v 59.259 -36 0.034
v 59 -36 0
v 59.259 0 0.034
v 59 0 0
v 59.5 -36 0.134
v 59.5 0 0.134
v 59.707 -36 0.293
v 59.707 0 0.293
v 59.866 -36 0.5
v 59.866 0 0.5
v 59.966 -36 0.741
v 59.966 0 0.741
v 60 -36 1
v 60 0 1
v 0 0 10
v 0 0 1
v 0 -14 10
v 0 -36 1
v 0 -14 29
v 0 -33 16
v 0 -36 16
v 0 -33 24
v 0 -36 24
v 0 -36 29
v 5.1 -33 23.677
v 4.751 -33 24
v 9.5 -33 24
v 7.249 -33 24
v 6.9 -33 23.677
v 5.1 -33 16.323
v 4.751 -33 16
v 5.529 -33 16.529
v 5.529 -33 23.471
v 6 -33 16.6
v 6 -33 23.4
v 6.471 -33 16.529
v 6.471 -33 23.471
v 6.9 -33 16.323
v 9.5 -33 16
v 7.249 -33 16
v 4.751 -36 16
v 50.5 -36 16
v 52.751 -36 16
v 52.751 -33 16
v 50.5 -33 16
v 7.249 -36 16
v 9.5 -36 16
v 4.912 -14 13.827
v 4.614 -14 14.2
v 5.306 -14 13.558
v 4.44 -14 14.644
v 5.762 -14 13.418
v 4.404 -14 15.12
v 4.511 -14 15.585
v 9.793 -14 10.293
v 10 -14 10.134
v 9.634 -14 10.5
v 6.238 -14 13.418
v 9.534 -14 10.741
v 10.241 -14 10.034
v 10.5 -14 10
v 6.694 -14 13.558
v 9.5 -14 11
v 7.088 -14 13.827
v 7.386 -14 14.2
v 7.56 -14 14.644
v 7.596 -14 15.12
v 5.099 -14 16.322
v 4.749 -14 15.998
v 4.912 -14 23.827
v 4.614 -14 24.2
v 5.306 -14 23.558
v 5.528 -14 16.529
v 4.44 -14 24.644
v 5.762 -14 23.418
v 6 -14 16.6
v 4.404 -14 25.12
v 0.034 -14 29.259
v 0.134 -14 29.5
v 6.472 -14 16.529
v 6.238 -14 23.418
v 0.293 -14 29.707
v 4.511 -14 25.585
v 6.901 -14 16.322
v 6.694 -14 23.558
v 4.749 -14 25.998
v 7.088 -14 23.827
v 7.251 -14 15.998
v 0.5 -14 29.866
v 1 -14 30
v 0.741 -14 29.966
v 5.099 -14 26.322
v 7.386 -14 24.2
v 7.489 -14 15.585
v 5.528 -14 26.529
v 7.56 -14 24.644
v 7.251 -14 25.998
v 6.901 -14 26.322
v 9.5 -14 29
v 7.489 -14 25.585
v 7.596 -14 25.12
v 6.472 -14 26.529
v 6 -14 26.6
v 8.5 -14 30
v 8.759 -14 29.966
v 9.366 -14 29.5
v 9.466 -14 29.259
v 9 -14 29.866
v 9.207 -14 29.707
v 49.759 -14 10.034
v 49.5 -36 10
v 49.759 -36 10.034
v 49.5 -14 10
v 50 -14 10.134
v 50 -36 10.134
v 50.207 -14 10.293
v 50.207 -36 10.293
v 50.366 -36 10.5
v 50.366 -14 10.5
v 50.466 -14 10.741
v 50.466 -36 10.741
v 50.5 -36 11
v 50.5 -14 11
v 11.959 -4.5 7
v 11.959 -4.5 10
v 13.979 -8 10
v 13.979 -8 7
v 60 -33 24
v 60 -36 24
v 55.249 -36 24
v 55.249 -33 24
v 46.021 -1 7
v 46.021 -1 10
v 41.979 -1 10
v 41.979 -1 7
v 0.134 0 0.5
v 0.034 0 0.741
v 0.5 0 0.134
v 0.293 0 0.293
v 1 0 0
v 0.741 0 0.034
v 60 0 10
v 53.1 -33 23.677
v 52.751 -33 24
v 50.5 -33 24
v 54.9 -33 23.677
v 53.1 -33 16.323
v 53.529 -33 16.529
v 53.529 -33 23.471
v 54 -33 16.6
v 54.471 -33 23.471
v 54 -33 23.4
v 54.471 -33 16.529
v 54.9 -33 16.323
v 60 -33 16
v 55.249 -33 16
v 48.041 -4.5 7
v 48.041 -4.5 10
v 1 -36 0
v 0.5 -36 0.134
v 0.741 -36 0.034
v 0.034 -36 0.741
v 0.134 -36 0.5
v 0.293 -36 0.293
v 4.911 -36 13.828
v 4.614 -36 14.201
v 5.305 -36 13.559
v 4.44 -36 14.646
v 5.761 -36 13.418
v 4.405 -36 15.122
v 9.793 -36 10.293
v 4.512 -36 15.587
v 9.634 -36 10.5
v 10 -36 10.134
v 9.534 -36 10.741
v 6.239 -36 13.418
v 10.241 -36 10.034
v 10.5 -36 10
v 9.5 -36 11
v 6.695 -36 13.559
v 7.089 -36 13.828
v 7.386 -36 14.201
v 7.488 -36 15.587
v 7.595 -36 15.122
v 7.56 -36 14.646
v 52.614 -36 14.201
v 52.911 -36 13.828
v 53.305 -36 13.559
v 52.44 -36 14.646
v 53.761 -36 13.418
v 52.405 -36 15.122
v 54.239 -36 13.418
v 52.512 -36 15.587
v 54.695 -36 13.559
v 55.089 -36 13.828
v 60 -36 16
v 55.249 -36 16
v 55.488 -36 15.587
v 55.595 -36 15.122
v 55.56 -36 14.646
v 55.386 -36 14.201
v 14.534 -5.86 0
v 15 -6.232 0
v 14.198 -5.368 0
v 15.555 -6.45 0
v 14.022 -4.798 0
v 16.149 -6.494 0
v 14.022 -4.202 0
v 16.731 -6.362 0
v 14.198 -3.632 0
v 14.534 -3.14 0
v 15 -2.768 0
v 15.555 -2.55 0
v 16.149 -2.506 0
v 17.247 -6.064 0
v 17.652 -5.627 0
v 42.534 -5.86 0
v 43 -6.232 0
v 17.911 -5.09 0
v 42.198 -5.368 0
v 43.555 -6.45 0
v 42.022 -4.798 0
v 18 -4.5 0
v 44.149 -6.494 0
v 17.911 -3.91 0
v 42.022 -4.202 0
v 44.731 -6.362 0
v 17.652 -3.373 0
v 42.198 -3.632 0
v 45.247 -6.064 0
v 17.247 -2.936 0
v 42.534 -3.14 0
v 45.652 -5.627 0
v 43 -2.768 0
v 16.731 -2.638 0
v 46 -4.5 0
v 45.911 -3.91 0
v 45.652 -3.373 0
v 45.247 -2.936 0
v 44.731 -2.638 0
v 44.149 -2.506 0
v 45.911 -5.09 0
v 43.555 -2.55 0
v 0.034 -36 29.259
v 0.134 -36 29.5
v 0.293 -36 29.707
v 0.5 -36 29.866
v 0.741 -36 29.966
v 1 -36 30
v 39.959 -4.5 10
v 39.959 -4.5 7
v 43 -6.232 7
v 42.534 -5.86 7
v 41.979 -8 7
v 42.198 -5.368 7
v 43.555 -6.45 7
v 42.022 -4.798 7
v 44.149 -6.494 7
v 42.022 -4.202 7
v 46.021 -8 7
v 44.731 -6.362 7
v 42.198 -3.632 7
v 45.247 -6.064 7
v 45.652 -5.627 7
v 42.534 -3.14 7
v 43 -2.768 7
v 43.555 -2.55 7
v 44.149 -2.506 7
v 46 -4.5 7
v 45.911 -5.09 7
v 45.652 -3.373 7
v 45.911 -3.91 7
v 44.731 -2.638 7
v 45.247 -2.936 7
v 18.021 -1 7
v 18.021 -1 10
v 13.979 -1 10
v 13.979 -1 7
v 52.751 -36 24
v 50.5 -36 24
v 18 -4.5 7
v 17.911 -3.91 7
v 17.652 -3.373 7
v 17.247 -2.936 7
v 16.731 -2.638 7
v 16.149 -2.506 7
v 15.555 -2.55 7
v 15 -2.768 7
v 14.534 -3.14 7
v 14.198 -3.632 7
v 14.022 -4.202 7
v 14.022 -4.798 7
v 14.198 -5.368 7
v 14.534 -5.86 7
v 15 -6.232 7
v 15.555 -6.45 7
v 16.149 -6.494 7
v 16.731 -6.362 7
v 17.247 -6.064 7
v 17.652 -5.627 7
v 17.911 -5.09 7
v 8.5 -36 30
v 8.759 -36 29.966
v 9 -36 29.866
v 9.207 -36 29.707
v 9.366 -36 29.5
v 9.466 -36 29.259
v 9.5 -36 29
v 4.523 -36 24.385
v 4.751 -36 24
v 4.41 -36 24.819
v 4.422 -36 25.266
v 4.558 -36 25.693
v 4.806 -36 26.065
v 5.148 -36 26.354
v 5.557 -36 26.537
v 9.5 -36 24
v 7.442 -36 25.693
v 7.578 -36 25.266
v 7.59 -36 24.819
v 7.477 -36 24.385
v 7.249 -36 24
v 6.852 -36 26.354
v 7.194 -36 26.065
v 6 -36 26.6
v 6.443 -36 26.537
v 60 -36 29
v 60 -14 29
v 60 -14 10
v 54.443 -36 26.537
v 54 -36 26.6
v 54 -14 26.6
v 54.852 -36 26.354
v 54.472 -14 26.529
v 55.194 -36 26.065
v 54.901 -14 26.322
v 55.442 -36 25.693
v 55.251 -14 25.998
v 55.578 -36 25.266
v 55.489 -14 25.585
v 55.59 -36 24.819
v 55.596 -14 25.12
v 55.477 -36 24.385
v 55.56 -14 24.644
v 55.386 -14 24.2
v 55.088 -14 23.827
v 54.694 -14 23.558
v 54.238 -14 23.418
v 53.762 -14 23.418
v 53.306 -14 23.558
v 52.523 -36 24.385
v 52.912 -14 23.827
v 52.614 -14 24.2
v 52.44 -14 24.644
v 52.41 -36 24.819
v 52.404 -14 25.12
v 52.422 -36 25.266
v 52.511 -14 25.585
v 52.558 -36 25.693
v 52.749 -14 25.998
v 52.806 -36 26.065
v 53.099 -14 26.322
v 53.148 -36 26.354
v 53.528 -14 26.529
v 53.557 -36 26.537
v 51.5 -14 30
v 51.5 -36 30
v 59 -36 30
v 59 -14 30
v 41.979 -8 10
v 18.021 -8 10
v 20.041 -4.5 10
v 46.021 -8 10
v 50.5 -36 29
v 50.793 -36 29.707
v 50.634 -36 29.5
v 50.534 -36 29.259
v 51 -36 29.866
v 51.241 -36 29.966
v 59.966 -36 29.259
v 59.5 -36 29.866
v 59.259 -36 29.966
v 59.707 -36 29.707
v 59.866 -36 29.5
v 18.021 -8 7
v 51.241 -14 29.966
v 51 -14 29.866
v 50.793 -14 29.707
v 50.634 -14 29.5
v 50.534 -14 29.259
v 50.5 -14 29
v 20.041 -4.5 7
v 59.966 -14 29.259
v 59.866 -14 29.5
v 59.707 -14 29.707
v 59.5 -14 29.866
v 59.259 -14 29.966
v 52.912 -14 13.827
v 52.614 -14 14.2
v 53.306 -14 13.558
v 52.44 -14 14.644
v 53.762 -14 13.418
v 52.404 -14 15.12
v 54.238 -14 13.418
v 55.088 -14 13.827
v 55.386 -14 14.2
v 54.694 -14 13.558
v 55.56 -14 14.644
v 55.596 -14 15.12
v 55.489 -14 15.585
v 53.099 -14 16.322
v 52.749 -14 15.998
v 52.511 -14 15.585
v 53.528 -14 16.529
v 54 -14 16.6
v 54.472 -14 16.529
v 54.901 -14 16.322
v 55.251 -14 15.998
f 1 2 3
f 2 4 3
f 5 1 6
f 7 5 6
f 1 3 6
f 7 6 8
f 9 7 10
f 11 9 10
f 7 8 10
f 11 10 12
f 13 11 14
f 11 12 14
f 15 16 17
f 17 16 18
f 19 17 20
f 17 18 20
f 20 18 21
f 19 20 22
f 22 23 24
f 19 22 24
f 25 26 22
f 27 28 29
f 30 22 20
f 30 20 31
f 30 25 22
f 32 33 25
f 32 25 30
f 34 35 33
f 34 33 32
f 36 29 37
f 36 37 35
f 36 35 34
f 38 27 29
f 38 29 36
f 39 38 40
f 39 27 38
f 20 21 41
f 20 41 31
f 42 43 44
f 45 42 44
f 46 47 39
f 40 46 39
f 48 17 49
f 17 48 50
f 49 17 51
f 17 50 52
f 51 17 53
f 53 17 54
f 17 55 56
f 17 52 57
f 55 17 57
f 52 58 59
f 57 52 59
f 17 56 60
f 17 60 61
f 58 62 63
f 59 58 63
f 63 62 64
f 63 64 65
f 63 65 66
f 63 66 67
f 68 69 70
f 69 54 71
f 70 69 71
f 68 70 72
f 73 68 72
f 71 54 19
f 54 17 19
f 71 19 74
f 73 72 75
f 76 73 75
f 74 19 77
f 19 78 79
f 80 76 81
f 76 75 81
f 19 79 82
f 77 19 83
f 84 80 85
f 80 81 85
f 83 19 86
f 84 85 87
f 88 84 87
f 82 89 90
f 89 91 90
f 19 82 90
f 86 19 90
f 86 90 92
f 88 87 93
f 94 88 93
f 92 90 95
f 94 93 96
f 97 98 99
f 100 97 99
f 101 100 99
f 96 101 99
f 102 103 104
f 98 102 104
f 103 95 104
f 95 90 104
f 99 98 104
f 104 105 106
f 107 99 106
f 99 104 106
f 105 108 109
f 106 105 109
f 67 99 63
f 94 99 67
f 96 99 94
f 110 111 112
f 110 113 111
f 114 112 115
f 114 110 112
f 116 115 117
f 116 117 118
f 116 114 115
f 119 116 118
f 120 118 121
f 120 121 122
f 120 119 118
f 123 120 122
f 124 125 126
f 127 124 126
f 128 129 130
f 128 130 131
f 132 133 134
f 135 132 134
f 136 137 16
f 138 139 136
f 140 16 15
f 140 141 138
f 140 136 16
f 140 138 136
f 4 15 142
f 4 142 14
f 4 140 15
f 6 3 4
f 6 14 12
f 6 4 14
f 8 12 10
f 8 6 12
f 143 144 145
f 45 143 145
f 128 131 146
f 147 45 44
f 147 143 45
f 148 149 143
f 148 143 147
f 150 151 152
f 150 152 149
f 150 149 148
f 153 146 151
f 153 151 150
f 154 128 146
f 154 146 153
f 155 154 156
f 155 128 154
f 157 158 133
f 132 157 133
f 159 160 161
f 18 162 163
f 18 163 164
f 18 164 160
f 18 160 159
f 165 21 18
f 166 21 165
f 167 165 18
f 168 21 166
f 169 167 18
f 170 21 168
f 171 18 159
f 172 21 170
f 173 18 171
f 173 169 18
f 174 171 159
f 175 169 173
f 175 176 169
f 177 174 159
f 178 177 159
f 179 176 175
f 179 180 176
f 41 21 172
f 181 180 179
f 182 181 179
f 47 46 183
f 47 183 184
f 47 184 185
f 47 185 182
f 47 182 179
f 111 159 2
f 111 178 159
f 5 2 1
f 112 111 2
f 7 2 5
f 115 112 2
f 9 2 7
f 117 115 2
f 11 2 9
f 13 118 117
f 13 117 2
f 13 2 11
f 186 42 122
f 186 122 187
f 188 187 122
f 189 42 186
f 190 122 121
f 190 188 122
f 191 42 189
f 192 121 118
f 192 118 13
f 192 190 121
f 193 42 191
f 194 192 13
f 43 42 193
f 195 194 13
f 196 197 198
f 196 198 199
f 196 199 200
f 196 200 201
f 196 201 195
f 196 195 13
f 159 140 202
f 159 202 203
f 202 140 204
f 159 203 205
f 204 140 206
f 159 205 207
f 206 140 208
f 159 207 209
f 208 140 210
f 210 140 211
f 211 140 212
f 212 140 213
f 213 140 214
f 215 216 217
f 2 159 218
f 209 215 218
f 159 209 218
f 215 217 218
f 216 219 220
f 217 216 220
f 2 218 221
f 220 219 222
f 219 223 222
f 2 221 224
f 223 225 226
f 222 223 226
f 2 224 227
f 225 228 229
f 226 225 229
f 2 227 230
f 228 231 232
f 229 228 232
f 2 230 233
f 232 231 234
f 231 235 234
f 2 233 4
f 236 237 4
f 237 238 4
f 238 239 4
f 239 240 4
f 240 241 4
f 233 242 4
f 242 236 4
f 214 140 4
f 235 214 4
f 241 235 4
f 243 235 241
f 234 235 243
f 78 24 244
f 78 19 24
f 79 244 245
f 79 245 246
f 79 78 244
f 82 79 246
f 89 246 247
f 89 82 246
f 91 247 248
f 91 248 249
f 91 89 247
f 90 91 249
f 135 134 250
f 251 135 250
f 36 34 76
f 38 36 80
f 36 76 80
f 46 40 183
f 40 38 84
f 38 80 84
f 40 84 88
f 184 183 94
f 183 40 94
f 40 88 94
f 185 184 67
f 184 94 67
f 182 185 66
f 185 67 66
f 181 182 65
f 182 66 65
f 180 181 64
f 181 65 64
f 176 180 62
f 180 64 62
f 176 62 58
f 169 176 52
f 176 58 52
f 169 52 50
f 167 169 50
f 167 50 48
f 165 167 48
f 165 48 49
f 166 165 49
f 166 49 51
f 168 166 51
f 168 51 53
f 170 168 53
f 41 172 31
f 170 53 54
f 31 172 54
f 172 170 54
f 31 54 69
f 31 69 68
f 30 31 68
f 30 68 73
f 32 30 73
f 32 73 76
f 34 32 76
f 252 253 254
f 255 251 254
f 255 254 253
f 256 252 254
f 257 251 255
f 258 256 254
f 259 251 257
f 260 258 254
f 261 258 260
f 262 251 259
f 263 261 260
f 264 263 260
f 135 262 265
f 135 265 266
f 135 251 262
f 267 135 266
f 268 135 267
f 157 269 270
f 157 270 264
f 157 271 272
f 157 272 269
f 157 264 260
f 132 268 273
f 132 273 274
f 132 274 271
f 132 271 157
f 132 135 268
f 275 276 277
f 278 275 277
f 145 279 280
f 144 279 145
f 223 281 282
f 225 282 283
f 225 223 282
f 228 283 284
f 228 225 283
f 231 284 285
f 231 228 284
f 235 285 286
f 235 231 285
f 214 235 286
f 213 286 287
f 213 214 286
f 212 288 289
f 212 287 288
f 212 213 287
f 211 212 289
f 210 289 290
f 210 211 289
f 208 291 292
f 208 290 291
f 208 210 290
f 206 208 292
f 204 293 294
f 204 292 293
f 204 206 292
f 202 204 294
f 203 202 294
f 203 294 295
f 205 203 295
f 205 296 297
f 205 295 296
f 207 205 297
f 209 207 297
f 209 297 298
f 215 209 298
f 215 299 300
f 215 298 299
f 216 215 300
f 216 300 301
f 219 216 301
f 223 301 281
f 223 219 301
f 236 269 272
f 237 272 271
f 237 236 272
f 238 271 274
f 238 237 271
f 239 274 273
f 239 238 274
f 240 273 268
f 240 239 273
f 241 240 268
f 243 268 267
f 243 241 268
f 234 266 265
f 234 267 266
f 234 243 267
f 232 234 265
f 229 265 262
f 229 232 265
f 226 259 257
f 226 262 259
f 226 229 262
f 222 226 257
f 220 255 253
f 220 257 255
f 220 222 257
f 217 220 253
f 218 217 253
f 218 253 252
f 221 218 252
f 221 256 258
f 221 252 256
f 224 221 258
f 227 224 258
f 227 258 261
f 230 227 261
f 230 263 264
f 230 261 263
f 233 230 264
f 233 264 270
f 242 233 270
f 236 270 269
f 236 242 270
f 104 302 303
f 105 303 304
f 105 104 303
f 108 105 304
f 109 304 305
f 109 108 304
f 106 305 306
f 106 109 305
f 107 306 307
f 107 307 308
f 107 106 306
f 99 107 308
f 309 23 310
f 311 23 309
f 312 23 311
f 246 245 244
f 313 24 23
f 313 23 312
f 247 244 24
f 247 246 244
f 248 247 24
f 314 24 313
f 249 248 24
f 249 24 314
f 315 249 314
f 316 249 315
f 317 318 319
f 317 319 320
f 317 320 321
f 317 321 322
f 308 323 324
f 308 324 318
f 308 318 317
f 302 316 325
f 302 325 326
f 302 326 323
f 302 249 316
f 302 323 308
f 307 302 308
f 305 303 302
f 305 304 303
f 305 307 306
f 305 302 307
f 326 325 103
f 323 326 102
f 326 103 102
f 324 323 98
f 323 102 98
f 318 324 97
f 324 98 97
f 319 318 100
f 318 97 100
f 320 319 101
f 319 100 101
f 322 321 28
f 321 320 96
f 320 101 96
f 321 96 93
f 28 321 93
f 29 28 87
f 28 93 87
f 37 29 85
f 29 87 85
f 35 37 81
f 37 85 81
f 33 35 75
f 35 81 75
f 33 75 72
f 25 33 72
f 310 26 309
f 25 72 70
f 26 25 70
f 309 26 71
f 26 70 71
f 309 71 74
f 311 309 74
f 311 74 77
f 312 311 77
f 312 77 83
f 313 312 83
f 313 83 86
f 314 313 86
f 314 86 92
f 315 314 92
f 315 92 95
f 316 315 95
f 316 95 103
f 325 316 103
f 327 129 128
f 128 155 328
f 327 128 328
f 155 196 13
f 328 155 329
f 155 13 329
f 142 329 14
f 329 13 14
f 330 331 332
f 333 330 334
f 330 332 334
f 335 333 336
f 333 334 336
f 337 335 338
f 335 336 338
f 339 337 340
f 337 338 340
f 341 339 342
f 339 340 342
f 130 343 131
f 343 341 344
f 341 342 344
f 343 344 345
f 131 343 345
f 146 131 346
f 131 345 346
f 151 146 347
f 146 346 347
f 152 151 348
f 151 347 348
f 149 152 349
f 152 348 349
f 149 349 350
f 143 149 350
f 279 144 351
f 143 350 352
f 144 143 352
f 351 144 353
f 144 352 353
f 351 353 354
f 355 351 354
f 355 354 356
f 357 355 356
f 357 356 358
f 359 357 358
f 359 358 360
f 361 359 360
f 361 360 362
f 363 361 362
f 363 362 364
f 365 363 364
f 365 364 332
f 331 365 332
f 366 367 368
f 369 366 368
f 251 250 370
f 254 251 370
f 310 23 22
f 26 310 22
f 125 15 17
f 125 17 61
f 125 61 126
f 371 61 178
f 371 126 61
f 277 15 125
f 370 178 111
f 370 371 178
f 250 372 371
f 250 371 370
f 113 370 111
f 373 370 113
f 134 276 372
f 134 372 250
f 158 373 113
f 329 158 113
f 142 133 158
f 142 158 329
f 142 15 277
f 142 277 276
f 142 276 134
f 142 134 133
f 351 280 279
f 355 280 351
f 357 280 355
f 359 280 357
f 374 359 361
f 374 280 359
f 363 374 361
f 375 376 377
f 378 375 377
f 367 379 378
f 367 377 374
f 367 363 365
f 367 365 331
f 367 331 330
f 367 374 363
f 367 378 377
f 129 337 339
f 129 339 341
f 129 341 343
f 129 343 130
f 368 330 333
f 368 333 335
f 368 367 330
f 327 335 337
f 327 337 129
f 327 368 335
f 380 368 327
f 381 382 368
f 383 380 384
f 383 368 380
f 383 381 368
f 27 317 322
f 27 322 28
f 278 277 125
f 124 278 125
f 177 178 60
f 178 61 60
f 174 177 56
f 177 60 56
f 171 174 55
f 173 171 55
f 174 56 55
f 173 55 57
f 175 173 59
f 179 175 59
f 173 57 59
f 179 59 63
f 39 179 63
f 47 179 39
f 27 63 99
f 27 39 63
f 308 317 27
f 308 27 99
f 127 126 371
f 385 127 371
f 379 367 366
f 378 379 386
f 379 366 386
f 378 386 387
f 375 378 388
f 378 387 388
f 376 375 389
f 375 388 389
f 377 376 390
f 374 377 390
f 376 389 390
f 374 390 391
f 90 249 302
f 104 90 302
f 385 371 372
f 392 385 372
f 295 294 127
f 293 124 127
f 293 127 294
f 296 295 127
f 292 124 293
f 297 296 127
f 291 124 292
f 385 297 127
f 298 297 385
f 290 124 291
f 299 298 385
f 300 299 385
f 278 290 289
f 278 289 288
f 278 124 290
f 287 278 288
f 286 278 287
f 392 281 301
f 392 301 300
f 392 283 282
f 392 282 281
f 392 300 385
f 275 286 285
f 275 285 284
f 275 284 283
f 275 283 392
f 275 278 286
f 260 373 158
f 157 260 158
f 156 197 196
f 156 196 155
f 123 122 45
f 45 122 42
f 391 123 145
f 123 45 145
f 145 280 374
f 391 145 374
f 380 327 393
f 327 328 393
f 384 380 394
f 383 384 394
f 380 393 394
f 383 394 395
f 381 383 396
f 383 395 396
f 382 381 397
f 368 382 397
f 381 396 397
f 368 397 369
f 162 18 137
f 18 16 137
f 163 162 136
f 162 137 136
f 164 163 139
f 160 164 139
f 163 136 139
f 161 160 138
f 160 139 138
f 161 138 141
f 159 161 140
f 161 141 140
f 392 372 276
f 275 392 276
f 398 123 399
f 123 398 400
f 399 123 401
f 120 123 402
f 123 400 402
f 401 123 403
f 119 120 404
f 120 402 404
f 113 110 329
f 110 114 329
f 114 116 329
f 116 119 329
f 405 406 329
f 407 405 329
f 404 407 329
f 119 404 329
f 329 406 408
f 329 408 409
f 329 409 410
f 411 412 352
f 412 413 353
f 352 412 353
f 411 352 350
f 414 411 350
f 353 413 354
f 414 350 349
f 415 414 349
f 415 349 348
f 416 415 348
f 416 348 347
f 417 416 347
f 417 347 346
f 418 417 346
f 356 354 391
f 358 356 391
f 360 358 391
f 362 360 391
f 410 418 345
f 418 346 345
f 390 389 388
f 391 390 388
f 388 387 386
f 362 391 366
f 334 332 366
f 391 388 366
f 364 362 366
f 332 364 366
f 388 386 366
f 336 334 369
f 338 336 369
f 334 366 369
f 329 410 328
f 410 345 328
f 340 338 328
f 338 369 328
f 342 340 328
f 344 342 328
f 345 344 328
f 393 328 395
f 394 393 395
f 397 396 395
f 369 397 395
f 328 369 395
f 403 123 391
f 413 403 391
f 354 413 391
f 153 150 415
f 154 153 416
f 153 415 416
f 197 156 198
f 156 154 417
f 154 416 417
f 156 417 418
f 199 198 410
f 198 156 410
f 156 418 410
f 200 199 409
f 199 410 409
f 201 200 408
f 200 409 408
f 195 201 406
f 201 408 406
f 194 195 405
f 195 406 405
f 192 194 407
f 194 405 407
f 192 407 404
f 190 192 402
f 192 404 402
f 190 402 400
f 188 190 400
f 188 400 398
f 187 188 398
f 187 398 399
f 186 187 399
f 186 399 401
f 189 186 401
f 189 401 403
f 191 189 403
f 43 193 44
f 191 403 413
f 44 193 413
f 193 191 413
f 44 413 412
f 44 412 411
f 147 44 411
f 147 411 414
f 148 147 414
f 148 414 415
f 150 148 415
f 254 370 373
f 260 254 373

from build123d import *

# Parameters (mm, degrees)
SKETCH1_W           = 60
SKETCH1_H           = 36
SKETCH1_R           = 2
BOSS_EXTRUDE1_DEPTH = 10
SKETCH2_W           = 9.5
SKETCH2_H           = 20
BOSS_EXTRUDE2_DEPTH = 22
CUT_EXTRUDE1_REACH  = 72.597
SKETCH3_R           = 1.6
CUT_EXTRUDE2_DEPTH  = 3
LPATTERN1_COUNT     = 2
LPATTERN1_PITCH     = 28
FILLET1_R           = 1
SKETCH6_W           = 8
SKETCH6_H           = 3
CUT_EXTRUDE3_DEPTH  = 77.131465243


with BuildPart() as part:
    # Sketch1 → Boss-Extrude1 (new body)
    with BuildSketch(Plane.XY):
        with Locations((30, -18)):
            Rectangle(SKETCH1_W, SKETCH1_H)
        with Locations((16, -4.5)):
            Circle(SKETCH1_R, mode=Mode.SUBTRACT)
        with Locations((44, -4.5)):
            Circle(SKETCH1_R, mode=Mode.SUBTRACT)
    extrude(amount=BOSS_EXTRUDE1_DEPTH)

    # Sketch2 → Boss-Extrude2 (add)
    with BuildSketch(Plane.XZ.offset(36)):
        with Locations((4.75, 20)):
            Rectangle(SKETCH2_W, SKETCH2_H)
        with Locations((55.25, 20)):
            Rectangle(SKETCH2_W, SKETCH2_H)
    extrude(amount=-BOSS_EXTRUDE2_DEPTH)

    # Sketch3 → Cut-Extrude1 (cut, up to next)
    with BuildSketch(Plane(origin=(0, -14, 0), x_dir=(1, 0, 0), z_dir=(0, 1, 0)), mode=Mode.PRIVATE) as cut_extrude1_sk1:
        with Locations(Location((6, -15, 0), (0, 0, 270))):
            Circle(SKETCH3_R)
    cut_extrude1_tool1 = extrude(cut_extrude1_sk1.sketch, amount=-CUT_EXTRUDE1_REACH, mode=Mode.PRIVATE) & part.part
    # Sketch3 → Cut-Extrude1 (cut, up to next)
    with BuildSketch(Plane(origin=(0, -14, 0), x_dir=(1, 0, 0), z_dir=(0, 1, 0)), mode=Mode.PRIVATE) as cut_extrude1_sk2:
        with Locations(Location((54, -15, 0), (0, 0, 270))):
            Circle(SKETCH3_R)
    cut_extrude1_tool2 = extrude(cut_extrude1_sk2.sketch, amount=-CUT_EXTRUDE1_REACH, mode=Mode.PRIVATE) & part.part
    # Sketch3 → Cut-Extrude1 (cut, up to next)
    with BuildSketch(Plane(origin=(0, -14, 0), x_dir=(1, 0, 0), z_dir=(0, 1, 0)), mode=Mode.PRIVATE) as cut_extrude1_sk3:
        with Locations(Location((54, -25, 0), (0, 0, 270))):
            Circle(SKETCH3_R)
    cut_extrude1_tool3 = extrude(cut_extrude1_sk3.sketch, amount=-CUT_EXTRUDE1_REACH, mode=Mode.PRIVATE) & part.part
    # Sketch3 → Cut-Extrude1 (cut, up to next)
    with BuildSketch(Plane(origin=(0, -14, 0), x_dir=(1, 0, 0), z_dir=(0, 1, 0)), mode=Mode.PRIVATE) as cut_extrude1_sk4:
        with Locations(Location((6, -25, 0), (0, 0, 270))):
            Circle(SKETCH3_R)
    cut_extrude1_tool4 = extrude(cut_extrude1_sk4.sketch, amount=-CUT_EXTRUDE1_REACH, mode=Mode.PRIVATE) & part.part
    add(cut_extrude1_tool1.solids().sort_by_distance((6, -14, 15))[0], mode=Mode.SUBTRACT)
    add(cut_extrude1_tool2.solids().sort_by_distance((54, -14, 15))[0], mode=Mode.SUBTRACT)
    add(cut_extrude1_tool3.solids().sort_by_distance((54, -14, 25))[0], mode=Mode.SUBTRACT)
    add(cut_extrude1_tool4.solids().sort_by_distance((6, -14, 25))[0], mode=Mode.SUBTRACT)

    # Sketch4 → Cut-Extrude2 (cut)
    with BuildSketch(Plane.XY.offset(10)):
        Polygon((13.979274058, -1), (11.958548116, -4.5), (13.979274058, -8), (18.020725942, -8), (20.041451884, -4.5), (18.020725942, -1), align=None)
    cut_extrude2 = extrude(amount=-CUT_EXTRUDE2_DEPTH, mode=Mode.SUBTRACT)

    # LPattern1: Cut-Extrude2 ×2
    with Locations(*[(i * LPATTERN1_PITCH, 0, 0) for i in range(1, LPATTERN1_COUNT)]):
        add(cut_extrude2, mode=Mode.SUBTRACT)

    # Fillet1
    fillet1_edges = [part.edges().sort_by_distance(p)[0] for p in [
        (0, -25, 30),
        (9.5, -25, 30),
        (9.5, -25, 10),
        (60, -25, 30),
        (50.5, -25, 10),
        (50.5, -25, 30),
        (60, -18, 0),
        (0, -18, 0),
    ]]
    fillet(fillet1_edges, radius=FILLET1_R)

    # Sketch6 → Cut-Extrude3 (cut, through all)
    with BuildSketch(Plane(origin=(60, 0, 0), x_dir=(0, 0, -1), z_dir=(1, 0, 0))):
        with Locations((-20, -34.5)):
            Rectangle(SKETCH6_W, SKETCH6_H)
    extrude(amount=-CUT_EXTRUDE3_DEPTH, mode=Mode.SUBTRACT)


solid = part.part
